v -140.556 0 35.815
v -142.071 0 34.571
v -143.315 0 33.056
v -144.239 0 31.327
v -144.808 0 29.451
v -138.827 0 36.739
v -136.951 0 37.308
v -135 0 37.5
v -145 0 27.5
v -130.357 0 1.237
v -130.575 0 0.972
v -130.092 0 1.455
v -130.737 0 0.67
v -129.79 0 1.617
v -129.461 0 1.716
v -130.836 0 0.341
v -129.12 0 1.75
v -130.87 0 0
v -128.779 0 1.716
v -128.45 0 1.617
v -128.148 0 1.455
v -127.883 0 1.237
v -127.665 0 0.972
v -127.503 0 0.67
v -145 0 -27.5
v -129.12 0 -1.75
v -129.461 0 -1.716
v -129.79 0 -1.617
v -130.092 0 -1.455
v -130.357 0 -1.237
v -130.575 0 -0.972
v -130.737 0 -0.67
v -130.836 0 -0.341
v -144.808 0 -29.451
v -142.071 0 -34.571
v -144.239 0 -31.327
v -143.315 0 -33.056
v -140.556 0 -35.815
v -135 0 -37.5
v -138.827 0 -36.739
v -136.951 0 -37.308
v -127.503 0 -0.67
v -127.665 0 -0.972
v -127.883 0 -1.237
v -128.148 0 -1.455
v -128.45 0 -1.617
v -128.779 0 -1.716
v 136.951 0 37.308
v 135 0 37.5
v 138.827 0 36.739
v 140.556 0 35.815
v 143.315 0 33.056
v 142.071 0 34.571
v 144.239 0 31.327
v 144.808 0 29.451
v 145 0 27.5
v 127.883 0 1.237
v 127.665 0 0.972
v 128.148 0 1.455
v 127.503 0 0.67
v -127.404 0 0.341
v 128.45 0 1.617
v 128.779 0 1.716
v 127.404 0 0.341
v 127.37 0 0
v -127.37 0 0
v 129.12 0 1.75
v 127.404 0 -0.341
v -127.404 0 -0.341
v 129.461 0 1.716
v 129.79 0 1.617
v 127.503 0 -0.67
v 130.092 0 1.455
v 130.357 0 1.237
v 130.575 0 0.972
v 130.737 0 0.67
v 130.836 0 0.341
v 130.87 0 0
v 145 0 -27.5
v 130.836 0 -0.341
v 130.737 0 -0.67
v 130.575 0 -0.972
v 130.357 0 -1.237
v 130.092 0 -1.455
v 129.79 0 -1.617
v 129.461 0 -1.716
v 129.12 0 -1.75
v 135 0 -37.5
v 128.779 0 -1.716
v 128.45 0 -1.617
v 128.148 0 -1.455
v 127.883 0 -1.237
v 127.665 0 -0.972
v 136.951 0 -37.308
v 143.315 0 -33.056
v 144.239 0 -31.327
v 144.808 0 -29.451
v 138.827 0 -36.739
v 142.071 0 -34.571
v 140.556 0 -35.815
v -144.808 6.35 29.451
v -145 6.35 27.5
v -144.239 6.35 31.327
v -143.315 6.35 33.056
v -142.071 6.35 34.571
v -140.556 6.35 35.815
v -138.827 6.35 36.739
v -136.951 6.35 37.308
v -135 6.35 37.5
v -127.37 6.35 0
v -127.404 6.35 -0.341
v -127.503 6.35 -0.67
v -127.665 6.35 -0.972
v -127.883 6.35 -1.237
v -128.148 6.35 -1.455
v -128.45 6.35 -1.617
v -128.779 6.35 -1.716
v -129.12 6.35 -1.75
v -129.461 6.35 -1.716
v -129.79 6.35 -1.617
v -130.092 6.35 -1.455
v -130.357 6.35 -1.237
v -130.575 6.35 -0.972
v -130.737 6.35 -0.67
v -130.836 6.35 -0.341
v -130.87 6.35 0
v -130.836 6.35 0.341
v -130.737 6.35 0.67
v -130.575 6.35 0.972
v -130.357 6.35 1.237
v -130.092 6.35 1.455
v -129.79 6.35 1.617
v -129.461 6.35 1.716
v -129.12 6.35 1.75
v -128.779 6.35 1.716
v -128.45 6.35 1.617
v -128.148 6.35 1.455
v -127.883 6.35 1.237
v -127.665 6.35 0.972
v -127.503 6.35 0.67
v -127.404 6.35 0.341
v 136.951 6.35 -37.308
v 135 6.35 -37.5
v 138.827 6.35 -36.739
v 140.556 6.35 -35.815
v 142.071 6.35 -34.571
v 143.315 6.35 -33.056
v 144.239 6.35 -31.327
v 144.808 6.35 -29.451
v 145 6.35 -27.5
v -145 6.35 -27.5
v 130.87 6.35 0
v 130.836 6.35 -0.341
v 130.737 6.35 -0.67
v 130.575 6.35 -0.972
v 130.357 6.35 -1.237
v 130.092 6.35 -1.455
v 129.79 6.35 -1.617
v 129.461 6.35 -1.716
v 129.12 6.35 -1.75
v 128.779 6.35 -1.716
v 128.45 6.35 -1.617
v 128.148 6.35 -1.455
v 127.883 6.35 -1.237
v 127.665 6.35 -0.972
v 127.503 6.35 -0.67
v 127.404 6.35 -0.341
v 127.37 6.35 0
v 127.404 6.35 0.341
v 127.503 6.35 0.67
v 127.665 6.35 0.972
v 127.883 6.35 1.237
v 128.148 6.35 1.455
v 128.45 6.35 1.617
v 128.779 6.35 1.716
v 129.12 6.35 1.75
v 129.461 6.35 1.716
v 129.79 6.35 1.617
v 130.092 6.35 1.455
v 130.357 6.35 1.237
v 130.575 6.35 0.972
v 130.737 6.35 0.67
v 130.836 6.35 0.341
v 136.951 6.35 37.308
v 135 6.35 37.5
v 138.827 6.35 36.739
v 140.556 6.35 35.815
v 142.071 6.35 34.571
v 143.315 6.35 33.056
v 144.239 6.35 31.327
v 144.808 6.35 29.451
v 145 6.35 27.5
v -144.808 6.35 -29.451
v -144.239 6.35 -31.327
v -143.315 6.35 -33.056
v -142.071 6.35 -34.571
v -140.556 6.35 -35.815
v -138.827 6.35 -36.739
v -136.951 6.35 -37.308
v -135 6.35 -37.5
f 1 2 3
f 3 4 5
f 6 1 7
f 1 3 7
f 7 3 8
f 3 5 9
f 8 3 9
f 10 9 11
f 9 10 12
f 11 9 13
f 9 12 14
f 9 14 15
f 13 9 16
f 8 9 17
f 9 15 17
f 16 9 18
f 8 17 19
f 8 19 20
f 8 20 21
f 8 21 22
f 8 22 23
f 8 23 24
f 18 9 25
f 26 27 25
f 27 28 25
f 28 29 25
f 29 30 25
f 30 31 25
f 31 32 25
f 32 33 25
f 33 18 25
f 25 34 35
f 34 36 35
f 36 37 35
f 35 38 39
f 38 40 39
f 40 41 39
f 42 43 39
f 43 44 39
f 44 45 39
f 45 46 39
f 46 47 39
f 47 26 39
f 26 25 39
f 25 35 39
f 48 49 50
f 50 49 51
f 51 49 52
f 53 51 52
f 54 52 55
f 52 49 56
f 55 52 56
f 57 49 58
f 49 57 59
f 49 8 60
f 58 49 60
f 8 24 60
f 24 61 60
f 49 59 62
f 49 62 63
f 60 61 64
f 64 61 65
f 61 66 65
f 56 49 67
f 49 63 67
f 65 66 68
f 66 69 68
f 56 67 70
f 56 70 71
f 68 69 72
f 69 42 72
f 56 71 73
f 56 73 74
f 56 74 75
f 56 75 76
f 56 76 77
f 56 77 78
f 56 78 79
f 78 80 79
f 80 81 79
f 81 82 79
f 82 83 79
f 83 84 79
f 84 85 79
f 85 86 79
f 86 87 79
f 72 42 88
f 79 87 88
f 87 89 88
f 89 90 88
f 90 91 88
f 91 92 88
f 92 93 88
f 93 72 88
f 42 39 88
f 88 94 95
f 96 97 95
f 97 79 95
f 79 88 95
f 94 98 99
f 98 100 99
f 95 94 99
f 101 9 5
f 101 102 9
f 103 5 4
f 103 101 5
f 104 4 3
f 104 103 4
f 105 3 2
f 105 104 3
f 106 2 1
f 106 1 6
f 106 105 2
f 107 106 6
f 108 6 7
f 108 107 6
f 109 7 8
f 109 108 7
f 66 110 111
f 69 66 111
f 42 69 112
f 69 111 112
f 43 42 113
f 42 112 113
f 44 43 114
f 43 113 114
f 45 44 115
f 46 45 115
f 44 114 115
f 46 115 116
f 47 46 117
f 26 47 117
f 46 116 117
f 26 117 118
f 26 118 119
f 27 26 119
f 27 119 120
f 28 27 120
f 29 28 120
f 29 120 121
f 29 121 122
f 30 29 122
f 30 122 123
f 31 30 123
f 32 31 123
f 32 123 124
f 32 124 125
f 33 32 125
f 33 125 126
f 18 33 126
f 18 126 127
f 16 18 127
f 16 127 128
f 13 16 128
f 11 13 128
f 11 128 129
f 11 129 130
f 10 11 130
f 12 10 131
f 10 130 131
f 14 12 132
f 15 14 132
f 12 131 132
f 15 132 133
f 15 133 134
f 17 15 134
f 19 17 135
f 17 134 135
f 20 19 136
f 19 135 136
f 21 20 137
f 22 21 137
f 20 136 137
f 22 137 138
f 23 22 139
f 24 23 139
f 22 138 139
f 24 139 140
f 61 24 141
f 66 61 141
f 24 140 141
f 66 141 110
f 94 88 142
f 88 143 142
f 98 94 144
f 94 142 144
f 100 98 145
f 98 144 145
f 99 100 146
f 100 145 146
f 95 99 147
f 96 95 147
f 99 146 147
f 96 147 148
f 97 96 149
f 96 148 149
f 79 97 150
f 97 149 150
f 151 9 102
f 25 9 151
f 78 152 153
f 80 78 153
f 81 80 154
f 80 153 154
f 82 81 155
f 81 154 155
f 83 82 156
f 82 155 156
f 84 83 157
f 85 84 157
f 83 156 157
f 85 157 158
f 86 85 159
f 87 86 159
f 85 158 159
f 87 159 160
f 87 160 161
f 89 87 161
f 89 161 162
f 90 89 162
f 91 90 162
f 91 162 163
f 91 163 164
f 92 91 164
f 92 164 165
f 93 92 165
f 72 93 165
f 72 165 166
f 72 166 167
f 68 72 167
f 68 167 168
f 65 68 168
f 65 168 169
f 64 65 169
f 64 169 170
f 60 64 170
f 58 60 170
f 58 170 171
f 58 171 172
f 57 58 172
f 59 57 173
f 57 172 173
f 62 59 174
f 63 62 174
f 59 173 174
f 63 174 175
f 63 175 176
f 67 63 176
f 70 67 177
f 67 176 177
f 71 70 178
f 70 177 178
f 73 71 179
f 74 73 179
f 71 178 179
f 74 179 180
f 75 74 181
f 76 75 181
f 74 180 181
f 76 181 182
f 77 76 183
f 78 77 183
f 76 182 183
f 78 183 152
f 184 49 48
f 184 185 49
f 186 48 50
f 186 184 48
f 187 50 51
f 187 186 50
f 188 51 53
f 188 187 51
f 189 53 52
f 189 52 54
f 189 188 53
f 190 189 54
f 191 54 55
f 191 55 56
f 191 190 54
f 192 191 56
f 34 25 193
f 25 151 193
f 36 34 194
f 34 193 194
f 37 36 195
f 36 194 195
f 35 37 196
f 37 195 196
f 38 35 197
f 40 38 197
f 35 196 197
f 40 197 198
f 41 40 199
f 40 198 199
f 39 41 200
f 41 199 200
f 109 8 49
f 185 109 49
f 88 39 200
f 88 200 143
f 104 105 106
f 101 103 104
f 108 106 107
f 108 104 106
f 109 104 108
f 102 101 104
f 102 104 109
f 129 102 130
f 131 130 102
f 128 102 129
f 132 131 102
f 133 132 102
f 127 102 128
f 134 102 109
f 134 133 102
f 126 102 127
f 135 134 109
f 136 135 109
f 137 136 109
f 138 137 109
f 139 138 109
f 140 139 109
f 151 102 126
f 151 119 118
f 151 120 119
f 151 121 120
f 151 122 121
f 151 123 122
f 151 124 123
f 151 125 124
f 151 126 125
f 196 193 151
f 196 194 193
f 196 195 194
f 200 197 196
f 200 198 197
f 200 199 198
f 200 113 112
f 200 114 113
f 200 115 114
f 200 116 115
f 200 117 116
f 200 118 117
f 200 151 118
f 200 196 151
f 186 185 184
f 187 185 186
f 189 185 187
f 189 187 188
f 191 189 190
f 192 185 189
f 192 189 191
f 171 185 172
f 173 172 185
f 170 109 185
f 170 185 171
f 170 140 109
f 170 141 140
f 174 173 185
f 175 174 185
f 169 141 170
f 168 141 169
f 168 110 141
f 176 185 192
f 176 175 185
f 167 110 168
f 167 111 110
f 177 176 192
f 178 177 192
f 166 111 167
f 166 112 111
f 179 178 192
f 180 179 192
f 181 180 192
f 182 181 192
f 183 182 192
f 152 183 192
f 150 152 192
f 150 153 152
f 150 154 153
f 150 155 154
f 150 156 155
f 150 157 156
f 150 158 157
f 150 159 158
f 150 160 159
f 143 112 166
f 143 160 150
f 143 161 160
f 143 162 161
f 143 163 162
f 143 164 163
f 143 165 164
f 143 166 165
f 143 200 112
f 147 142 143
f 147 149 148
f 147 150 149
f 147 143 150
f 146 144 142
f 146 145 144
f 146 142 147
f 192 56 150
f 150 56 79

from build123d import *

# Parameters (mm, degrees)
SKETCH1_W           = 290
SKETCH1_H           = 75
BOSS_EXTRUDE1_DEPTH = 6.35
SKETCH2_R           = 1.75
CUT_EXTRUDE1_DEPTH  = 7.35
SKETCH3_R           = 1.75
CUT_EXTRUDE2_DEPTH  = 7.35
FILLET1_R           = 10


with BuildPart() as part:
    # Sketch1 → Boss-Extrude1 (new body)
    with BuildSketch(Plane(origin=(0, 0, 0), x_dir=(1, 0, 0), z_dir=(0, 1, 0))):
        Rectangle(SKETCH1_W, SKETCH1_H)
    extrude(amount=BOSS_EXTRUDE1_DEPTH)

    # Sketch2 → Cut-Extrude1 (cut, through all)
    with BuildSketch(Plane(origin=(0, 6.35, 0), x_dir=(1, 0, 0), z_dir=(0, 1, 0))):
        with Locations((-129.12, 0)):
            Circle(SKETCH2_R)
    extrude(amount=-CUT_EXTRUDE1_DEPTH, mode=Mode.SUBTRACT)

    # Sketch3 → Cut-Extrude2 (cut, through all)
    with BuildSketch(Plane(origin=(0, 6.35, 0), x_dir=(1, 0, 0), z_dir=(0, 1, 0))):
        with Locations((129.12, 0)):
            Circle(SKETCH3_R)
    extrude(amount=-CUT_EXTRUDE2_DEPTH, mode=Mode.SUBTRACT)

    # Fillet1
    fillet1_edges = [part.edges().sort_by_distance(p)[0] for p in [
        (145, 3.175, 37.5),
        (-145, 3.175, 37.5),
        (-145, 3.175, -37.5),
        (145, 3.175, -37.5),
    ]]
    fillet(fillet1_edges, radius=FILLET1_R)


solid = part.part
